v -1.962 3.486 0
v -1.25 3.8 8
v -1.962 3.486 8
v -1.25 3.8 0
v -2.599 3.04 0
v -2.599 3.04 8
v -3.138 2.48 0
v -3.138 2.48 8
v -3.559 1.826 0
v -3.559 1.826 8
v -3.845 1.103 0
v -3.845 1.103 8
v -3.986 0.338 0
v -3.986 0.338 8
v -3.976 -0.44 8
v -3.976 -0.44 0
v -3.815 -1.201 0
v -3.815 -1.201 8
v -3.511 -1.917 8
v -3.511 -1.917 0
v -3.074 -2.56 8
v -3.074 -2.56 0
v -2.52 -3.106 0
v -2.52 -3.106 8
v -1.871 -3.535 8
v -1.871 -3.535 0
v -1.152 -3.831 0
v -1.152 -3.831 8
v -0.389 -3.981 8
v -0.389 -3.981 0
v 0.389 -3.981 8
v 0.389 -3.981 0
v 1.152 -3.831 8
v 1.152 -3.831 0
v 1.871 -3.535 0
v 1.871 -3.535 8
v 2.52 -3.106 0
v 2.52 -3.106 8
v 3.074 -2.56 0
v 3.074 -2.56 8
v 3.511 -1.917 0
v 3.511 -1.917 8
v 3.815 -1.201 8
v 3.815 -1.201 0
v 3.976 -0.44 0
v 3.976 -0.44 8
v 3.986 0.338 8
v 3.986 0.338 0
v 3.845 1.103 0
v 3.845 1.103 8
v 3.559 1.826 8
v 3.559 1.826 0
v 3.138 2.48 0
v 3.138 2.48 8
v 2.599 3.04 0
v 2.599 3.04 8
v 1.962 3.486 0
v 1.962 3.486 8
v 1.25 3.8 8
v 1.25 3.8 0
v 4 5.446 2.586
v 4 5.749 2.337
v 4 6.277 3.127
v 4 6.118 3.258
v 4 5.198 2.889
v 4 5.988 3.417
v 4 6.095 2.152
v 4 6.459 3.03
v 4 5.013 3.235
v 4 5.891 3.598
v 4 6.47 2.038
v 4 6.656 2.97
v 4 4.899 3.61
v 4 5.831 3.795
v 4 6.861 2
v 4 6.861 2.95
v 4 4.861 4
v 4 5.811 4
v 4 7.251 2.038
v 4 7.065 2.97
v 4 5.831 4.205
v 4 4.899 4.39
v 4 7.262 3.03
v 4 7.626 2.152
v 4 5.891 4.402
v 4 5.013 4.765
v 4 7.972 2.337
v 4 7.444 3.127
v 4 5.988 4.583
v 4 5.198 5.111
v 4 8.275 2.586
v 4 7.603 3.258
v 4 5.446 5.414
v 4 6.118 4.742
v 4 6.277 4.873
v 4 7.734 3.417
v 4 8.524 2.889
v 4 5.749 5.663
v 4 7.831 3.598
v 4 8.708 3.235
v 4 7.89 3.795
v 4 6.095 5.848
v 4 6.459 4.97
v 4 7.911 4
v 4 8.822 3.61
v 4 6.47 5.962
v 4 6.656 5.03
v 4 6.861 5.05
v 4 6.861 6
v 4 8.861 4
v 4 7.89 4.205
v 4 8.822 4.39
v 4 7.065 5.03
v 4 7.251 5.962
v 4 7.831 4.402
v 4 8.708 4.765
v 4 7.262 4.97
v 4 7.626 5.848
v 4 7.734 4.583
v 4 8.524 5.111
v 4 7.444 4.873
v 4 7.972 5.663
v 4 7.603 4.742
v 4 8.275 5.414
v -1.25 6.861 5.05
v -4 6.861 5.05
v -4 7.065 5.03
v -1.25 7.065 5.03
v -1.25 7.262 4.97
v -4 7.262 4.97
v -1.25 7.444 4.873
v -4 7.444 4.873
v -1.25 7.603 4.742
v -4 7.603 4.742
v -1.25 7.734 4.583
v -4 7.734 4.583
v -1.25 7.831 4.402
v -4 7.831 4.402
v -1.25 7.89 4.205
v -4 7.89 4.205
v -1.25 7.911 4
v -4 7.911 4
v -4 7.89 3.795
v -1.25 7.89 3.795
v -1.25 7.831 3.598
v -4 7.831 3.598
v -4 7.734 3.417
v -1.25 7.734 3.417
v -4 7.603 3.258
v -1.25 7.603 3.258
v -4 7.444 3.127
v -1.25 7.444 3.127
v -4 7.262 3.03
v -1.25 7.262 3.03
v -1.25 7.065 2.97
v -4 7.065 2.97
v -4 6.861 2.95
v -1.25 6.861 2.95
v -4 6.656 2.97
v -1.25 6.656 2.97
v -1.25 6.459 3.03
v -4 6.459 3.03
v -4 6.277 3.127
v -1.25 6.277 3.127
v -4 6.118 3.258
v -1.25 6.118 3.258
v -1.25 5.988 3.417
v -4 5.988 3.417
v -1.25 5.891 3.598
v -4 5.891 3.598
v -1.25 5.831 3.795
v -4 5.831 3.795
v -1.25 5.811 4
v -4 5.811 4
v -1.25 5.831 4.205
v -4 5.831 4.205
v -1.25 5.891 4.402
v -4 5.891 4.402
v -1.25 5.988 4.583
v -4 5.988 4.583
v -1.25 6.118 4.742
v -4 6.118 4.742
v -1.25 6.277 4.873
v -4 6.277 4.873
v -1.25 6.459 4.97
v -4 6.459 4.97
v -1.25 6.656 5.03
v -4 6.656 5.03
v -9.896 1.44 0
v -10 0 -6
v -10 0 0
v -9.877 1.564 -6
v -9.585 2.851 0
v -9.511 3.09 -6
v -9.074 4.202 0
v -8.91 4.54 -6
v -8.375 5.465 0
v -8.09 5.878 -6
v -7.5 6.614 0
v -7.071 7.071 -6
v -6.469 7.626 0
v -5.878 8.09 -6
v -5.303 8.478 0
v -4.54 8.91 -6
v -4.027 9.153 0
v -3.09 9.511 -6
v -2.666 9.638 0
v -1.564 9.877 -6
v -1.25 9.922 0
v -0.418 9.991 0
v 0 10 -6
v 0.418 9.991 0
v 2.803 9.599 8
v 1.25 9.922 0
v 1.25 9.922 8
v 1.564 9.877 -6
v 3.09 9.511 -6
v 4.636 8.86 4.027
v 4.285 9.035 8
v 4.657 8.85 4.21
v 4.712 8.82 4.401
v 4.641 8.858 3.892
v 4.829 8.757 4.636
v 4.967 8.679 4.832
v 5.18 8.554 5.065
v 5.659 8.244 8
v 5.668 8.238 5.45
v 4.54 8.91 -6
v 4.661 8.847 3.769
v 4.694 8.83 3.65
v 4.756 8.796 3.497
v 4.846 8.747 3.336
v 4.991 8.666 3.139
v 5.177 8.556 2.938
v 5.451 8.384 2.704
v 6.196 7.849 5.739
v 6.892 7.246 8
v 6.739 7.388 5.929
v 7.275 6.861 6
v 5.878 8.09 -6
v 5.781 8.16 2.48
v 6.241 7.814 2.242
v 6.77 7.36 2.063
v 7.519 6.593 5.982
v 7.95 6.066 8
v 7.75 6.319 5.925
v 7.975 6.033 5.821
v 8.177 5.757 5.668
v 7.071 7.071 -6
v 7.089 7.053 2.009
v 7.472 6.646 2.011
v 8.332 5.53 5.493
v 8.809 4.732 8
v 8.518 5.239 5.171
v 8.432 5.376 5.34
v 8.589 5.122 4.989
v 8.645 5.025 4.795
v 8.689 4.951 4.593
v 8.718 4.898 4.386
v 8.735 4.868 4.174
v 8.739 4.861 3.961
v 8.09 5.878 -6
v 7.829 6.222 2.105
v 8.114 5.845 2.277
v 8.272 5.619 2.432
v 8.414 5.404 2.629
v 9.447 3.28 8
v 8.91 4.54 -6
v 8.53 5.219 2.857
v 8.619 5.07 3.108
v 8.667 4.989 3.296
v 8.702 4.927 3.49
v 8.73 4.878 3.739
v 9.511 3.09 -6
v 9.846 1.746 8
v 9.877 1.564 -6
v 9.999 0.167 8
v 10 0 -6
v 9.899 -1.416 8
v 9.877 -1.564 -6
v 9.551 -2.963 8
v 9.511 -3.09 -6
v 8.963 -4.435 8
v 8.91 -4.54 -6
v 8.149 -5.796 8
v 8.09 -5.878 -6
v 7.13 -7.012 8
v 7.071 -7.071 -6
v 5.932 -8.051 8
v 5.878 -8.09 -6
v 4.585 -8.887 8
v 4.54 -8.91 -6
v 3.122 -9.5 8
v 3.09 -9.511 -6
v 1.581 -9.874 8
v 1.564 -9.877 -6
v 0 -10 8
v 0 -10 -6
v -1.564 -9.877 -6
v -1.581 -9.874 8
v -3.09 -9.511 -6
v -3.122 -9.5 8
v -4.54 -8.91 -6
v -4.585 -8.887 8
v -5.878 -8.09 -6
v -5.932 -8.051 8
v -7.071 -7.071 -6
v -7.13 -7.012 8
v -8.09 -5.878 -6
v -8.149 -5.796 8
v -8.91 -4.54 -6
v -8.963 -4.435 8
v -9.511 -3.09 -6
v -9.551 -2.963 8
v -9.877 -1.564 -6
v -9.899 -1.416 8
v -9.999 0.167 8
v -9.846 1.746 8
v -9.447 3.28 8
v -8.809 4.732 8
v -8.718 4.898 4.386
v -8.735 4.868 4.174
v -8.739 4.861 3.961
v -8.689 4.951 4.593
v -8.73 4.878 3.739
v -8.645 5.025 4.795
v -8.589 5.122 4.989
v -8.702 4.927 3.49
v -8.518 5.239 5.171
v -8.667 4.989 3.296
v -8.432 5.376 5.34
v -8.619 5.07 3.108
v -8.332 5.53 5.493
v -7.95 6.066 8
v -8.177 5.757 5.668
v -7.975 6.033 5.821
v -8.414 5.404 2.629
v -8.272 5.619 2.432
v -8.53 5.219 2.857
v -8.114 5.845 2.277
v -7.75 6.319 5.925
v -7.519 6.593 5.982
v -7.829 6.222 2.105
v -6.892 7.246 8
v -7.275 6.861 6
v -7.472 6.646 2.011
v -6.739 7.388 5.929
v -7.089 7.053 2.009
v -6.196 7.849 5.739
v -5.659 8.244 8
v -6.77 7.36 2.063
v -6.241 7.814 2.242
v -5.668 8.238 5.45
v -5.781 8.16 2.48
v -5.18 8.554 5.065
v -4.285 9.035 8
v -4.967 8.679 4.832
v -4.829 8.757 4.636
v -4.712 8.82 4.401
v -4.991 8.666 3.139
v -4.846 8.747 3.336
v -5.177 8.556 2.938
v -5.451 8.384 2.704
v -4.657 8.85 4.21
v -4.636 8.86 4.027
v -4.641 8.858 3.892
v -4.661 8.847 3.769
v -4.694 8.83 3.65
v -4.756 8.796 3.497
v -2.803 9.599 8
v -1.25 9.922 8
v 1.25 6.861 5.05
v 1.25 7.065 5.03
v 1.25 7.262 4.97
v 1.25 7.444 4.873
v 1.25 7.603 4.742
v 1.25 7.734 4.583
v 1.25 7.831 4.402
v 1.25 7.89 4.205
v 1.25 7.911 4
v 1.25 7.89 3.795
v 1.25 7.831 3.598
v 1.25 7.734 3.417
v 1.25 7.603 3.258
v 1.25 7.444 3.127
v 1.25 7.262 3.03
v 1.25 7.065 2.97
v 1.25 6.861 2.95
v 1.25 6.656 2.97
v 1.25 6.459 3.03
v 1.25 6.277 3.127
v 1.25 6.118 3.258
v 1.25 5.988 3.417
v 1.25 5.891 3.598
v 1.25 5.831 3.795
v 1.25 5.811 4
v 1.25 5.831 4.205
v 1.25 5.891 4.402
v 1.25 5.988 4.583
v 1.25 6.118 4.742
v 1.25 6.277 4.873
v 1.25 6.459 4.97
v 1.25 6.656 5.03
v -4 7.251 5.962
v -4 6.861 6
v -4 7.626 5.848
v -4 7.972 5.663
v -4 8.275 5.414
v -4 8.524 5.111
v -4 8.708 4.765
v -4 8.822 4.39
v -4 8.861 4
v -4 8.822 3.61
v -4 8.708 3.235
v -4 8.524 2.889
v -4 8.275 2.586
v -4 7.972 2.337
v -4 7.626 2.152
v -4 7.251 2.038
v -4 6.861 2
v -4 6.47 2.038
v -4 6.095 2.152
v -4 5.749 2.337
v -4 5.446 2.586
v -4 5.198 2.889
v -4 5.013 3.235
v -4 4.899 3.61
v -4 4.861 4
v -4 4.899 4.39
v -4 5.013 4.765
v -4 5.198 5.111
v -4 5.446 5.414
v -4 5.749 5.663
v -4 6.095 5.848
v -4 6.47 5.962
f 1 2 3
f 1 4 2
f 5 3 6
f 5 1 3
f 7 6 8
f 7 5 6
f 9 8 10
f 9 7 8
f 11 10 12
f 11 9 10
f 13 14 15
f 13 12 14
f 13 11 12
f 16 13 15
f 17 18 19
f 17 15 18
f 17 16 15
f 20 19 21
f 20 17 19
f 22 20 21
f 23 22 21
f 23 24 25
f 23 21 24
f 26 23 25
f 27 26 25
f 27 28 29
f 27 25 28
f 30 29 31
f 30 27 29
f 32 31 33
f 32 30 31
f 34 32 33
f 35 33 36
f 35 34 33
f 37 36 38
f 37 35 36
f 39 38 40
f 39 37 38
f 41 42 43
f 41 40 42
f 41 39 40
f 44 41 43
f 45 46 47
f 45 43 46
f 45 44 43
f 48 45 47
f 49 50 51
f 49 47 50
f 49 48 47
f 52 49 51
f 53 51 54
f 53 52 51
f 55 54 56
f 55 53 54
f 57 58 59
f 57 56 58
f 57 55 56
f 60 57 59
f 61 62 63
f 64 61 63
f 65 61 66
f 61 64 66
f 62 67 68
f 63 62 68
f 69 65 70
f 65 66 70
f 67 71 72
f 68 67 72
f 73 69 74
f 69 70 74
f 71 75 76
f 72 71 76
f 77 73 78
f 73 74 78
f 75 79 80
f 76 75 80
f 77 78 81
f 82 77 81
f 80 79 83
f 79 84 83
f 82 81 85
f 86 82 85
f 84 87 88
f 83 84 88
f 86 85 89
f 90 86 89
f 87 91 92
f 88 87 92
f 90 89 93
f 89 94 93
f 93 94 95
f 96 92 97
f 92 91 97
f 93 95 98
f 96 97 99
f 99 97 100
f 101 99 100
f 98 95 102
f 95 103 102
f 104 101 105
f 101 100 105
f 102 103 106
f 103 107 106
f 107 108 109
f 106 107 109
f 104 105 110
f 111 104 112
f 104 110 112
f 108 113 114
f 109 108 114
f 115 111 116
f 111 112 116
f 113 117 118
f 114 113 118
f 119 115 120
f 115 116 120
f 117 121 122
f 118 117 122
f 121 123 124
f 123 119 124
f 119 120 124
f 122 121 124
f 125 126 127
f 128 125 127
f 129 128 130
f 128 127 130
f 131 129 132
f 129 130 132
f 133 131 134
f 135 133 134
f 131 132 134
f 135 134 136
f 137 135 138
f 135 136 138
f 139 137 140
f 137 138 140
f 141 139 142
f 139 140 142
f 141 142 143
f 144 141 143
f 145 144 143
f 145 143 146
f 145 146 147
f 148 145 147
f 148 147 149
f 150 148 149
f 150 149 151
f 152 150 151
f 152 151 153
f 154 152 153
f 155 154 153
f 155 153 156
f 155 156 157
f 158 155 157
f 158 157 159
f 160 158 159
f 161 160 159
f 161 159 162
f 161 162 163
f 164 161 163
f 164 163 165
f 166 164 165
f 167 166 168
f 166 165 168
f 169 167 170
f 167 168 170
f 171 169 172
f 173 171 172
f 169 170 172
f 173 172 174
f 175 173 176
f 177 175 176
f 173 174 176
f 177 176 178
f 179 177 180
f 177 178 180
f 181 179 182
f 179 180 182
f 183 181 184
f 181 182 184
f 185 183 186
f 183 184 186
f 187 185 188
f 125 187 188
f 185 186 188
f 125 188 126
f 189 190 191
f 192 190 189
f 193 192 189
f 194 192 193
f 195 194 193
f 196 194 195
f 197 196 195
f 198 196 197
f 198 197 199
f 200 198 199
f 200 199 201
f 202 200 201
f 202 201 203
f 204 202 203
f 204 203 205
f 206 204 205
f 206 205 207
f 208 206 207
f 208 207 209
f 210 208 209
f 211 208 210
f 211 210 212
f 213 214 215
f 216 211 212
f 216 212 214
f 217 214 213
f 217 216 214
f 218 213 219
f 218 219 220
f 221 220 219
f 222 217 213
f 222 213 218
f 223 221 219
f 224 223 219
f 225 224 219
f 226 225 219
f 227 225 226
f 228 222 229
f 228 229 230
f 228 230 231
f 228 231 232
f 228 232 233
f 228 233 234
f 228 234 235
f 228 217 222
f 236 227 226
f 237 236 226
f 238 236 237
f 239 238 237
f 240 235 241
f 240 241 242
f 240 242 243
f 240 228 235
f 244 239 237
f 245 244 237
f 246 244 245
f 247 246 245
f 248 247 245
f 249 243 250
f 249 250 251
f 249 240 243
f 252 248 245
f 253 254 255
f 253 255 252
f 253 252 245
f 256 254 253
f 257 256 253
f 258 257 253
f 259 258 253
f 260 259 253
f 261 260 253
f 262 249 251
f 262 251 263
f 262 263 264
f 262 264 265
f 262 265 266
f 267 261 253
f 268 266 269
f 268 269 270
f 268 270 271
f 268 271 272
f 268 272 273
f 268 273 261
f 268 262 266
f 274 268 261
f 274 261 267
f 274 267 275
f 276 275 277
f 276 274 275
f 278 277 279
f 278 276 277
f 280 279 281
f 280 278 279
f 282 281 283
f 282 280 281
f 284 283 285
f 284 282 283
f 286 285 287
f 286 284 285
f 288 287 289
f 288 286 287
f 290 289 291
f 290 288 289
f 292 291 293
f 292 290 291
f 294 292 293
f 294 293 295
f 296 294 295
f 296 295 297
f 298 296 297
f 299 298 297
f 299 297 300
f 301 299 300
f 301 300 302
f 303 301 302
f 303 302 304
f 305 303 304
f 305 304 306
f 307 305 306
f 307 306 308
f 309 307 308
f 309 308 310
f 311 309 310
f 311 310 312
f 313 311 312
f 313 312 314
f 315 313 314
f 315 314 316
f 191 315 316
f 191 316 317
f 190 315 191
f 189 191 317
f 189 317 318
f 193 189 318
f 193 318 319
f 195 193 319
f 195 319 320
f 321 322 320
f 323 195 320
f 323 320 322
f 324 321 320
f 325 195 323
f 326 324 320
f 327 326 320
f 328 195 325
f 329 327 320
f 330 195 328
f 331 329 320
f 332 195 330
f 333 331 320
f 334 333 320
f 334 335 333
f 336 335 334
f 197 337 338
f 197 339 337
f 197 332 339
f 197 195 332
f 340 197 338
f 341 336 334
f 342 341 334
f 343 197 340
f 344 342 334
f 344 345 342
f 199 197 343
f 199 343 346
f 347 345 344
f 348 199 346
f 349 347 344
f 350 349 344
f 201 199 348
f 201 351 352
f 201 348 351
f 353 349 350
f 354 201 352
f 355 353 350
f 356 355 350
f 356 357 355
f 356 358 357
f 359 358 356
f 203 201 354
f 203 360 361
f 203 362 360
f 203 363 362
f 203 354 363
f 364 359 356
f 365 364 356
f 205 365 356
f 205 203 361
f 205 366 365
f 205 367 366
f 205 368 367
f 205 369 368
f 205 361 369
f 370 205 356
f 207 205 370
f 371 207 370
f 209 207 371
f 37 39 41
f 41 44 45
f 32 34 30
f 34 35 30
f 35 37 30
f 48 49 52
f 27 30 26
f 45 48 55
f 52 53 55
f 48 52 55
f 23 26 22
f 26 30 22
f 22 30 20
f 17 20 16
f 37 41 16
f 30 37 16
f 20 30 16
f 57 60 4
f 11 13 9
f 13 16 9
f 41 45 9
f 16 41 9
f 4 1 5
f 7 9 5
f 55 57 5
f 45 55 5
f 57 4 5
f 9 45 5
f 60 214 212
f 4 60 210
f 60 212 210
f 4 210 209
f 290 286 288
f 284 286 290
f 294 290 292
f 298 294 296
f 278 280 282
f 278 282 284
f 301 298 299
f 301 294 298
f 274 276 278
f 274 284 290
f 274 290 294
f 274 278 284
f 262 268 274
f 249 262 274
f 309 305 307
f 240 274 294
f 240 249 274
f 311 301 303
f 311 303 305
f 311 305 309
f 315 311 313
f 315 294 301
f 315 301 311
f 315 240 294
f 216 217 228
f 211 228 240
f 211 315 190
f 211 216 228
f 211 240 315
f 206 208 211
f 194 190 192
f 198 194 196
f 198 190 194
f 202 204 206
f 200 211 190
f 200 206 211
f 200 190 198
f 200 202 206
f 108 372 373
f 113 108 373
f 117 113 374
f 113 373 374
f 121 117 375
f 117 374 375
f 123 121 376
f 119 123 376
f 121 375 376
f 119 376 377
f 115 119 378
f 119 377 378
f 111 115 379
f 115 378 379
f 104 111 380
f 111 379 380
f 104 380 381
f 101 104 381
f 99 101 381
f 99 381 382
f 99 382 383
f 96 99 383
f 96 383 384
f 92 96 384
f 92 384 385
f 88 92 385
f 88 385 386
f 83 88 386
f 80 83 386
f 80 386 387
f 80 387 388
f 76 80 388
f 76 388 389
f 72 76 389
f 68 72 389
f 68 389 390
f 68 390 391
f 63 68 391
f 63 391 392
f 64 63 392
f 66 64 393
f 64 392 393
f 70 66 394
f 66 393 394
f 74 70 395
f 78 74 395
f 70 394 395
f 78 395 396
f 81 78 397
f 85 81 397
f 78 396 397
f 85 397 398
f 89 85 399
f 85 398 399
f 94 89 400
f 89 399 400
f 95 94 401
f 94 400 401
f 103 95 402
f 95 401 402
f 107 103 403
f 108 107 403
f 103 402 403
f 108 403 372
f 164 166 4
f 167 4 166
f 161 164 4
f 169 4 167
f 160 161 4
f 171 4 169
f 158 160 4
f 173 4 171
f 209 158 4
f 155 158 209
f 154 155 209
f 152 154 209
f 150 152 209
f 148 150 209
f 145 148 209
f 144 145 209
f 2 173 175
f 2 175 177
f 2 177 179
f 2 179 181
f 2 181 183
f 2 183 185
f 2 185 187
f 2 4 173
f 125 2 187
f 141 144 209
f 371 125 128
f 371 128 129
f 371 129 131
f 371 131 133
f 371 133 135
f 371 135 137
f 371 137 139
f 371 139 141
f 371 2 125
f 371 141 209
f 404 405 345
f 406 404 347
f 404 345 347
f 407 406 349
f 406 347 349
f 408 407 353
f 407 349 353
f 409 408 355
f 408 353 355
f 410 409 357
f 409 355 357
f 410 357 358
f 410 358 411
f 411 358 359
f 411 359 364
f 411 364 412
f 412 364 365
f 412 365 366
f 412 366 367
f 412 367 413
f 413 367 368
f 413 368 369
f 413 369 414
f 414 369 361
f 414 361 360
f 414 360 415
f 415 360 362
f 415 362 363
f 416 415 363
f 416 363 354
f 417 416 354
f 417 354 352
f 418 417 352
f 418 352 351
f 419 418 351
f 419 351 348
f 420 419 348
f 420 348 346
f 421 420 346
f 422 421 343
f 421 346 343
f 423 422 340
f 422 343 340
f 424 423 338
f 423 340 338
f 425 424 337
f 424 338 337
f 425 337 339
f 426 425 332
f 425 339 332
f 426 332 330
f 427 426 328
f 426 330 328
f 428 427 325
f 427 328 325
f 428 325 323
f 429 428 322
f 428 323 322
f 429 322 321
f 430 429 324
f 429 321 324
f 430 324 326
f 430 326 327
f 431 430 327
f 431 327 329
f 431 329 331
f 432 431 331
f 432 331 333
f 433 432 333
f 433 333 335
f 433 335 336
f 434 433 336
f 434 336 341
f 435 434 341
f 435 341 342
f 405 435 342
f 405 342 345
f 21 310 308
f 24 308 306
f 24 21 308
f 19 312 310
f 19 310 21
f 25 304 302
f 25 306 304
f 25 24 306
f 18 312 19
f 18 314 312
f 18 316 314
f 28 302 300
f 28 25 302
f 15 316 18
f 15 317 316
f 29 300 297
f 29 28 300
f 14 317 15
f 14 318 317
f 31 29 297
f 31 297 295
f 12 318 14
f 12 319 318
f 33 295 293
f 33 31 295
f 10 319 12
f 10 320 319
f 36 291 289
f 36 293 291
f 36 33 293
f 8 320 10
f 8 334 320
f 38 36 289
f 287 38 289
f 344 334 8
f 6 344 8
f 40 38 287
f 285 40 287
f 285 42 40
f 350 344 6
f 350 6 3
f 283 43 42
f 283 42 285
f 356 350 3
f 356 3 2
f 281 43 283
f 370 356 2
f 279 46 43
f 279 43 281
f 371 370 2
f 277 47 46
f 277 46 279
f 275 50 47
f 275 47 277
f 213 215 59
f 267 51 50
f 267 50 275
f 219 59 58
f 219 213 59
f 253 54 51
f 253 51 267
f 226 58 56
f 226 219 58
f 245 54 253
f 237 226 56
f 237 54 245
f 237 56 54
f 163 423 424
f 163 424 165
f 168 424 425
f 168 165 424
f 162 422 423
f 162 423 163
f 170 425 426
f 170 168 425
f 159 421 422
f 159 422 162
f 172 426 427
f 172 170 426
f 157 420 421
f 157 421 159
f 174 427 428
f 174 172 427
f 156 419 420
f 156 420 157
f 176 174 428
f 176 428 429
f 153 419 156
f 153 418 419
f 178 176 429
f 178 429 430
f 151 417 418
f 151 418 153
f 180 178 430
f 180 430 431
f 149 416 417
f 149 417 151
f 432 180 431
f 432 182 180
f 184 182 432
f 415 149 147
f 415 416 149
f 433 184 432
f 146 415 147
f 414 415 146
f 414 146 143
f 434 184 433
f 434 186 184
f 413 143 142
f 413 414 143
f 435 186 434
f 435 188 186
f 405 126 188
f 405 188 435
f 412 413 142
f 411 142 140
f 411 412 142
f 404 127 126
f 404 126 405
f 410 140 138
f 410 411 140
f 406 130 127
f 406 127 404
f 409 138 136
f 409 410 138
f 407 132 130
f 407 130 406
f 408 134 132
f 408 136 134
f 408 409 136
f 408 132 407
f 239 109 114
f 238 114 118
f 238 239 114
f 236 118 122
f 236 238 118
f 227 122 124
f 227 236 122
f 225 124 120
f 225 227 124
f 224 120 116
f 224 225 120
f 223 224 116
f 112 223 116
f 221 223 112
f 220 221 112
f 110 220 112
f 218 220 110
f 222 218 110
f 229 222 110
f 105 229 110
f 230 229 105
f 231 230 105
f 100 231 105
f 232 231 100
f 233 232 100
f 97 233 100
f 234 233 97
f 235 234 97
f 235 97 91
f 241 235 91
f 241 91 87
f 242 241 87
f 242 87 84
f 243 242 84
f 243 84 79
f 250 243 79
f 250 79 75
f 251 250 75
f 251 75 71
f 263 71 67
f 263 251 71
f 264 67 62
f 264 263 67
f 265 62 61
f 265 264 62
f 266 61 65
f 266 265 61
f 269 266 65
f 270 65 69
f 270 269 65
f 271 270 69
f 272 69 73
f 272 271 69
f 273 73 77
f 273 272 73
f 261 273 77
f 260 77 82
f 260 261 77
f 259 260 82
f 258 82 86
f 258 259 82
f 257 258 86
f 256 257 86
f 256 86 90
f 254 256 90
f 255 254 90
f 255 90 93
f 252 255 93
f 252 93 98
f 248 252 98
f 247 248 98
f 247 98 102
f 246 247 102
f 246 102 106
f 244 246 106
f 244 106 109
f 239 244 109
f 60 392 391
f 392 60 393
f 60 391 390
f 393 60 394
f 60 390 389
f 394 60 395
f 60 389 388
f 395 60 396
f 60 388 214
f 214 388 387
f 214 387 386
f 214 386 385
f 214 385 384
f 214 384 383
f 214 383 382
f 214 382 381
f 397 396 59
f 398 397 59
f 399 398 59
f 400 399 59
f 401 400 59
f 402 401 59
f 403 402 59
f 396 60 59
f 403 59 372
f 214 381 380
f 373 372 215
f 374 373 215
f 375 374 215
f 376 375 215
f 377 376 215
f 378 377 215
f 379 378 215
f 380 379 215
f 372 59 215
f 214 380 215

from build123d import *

# Parameters (mm, degrees)
SKETCH1_R           = 10
SKETCH1_R_2         = 4
BOSS_EXTRUDE1_DEPTH = 8
SKETCH2_W           = 2.5
SKETCH2_H           = 11.075471698
CUT_EXTRUDE1_DEPTH  = 17.248076809
SKETCH3_R           = 1.05
CUT_EXTRUDE2_DEPTH  = 24.748684174
SKETCH4_R           = 2
CUT_EXTRUDE3_DEPTH  = 6
BOSS_EXTRUDE3_START = 6
SKETCH6_R           = 10
BOSS_EXTRUDE3_DEPTH = 6


with BuildPart() as part:
    # Sketch1 → Boss-Extrude1 (new body)
    with BuildSketch(Plane.XY):
        Circle(SKETCH1_R)
        Circle(SKETCH1_R_2, mode=Mode.SUBTRACT)
    extrude(amount=BOSS_EXTRUDE1_DEPTH)

    # Sketch2 → Cut-Extrude1 (cut, through all)
    with BuildSketch(Plane.XY.offset(8)):
        with Locations((0, 5.537735849)):
            Rectangle(SKETCH2_W, SKETCH2_H)
    extrude(amount=-CUT_EXTRUDE1_DEPTH, mode=Mode.SUBTRACT)

    # Sketch3 → Cut-Extrude2 (cut, through all)
    with BuildSketch(Plane.ZY.offset(10)):
        with Locations((4, 6.860619227)):
            Circle(SKETCH3_R)
    extrude(amount=-CUT_EXTRUDE2_DEPTH, mode=Mode.SUBTRACT)

    # Sketch4 → Cut-Extrude3 (cut)
    with BuildSketch(Plane.ZY.offset(10)):
        with Locations((4, 6.860619227)):
            Circle(SKETCH4_R)
    cut_extrude3 = extrude(amount=-CUT_EXTRUDE3_DEPTH, mode=Mode.SUBTRACT)

    # Mirror1: Cut-Extrude3 across plane
    add(cut_extrude3.mirror(Plane.ZY), mode=Mode.SUBTRACT)

    # Sketch6 → Boss-Extrude3 (add)
    with BuildSketch(Plane(origin=(0, 0, 0), x_dir=(-1, 0, 0), z_dir=(0, 0, -1)).offset(BOSS_EXTRUDE3_START)):
        Circle(SKETCH6_R)
    extrude(amount=-BOSS_EXTRUDE3_DEPTH)


solid = part.part
